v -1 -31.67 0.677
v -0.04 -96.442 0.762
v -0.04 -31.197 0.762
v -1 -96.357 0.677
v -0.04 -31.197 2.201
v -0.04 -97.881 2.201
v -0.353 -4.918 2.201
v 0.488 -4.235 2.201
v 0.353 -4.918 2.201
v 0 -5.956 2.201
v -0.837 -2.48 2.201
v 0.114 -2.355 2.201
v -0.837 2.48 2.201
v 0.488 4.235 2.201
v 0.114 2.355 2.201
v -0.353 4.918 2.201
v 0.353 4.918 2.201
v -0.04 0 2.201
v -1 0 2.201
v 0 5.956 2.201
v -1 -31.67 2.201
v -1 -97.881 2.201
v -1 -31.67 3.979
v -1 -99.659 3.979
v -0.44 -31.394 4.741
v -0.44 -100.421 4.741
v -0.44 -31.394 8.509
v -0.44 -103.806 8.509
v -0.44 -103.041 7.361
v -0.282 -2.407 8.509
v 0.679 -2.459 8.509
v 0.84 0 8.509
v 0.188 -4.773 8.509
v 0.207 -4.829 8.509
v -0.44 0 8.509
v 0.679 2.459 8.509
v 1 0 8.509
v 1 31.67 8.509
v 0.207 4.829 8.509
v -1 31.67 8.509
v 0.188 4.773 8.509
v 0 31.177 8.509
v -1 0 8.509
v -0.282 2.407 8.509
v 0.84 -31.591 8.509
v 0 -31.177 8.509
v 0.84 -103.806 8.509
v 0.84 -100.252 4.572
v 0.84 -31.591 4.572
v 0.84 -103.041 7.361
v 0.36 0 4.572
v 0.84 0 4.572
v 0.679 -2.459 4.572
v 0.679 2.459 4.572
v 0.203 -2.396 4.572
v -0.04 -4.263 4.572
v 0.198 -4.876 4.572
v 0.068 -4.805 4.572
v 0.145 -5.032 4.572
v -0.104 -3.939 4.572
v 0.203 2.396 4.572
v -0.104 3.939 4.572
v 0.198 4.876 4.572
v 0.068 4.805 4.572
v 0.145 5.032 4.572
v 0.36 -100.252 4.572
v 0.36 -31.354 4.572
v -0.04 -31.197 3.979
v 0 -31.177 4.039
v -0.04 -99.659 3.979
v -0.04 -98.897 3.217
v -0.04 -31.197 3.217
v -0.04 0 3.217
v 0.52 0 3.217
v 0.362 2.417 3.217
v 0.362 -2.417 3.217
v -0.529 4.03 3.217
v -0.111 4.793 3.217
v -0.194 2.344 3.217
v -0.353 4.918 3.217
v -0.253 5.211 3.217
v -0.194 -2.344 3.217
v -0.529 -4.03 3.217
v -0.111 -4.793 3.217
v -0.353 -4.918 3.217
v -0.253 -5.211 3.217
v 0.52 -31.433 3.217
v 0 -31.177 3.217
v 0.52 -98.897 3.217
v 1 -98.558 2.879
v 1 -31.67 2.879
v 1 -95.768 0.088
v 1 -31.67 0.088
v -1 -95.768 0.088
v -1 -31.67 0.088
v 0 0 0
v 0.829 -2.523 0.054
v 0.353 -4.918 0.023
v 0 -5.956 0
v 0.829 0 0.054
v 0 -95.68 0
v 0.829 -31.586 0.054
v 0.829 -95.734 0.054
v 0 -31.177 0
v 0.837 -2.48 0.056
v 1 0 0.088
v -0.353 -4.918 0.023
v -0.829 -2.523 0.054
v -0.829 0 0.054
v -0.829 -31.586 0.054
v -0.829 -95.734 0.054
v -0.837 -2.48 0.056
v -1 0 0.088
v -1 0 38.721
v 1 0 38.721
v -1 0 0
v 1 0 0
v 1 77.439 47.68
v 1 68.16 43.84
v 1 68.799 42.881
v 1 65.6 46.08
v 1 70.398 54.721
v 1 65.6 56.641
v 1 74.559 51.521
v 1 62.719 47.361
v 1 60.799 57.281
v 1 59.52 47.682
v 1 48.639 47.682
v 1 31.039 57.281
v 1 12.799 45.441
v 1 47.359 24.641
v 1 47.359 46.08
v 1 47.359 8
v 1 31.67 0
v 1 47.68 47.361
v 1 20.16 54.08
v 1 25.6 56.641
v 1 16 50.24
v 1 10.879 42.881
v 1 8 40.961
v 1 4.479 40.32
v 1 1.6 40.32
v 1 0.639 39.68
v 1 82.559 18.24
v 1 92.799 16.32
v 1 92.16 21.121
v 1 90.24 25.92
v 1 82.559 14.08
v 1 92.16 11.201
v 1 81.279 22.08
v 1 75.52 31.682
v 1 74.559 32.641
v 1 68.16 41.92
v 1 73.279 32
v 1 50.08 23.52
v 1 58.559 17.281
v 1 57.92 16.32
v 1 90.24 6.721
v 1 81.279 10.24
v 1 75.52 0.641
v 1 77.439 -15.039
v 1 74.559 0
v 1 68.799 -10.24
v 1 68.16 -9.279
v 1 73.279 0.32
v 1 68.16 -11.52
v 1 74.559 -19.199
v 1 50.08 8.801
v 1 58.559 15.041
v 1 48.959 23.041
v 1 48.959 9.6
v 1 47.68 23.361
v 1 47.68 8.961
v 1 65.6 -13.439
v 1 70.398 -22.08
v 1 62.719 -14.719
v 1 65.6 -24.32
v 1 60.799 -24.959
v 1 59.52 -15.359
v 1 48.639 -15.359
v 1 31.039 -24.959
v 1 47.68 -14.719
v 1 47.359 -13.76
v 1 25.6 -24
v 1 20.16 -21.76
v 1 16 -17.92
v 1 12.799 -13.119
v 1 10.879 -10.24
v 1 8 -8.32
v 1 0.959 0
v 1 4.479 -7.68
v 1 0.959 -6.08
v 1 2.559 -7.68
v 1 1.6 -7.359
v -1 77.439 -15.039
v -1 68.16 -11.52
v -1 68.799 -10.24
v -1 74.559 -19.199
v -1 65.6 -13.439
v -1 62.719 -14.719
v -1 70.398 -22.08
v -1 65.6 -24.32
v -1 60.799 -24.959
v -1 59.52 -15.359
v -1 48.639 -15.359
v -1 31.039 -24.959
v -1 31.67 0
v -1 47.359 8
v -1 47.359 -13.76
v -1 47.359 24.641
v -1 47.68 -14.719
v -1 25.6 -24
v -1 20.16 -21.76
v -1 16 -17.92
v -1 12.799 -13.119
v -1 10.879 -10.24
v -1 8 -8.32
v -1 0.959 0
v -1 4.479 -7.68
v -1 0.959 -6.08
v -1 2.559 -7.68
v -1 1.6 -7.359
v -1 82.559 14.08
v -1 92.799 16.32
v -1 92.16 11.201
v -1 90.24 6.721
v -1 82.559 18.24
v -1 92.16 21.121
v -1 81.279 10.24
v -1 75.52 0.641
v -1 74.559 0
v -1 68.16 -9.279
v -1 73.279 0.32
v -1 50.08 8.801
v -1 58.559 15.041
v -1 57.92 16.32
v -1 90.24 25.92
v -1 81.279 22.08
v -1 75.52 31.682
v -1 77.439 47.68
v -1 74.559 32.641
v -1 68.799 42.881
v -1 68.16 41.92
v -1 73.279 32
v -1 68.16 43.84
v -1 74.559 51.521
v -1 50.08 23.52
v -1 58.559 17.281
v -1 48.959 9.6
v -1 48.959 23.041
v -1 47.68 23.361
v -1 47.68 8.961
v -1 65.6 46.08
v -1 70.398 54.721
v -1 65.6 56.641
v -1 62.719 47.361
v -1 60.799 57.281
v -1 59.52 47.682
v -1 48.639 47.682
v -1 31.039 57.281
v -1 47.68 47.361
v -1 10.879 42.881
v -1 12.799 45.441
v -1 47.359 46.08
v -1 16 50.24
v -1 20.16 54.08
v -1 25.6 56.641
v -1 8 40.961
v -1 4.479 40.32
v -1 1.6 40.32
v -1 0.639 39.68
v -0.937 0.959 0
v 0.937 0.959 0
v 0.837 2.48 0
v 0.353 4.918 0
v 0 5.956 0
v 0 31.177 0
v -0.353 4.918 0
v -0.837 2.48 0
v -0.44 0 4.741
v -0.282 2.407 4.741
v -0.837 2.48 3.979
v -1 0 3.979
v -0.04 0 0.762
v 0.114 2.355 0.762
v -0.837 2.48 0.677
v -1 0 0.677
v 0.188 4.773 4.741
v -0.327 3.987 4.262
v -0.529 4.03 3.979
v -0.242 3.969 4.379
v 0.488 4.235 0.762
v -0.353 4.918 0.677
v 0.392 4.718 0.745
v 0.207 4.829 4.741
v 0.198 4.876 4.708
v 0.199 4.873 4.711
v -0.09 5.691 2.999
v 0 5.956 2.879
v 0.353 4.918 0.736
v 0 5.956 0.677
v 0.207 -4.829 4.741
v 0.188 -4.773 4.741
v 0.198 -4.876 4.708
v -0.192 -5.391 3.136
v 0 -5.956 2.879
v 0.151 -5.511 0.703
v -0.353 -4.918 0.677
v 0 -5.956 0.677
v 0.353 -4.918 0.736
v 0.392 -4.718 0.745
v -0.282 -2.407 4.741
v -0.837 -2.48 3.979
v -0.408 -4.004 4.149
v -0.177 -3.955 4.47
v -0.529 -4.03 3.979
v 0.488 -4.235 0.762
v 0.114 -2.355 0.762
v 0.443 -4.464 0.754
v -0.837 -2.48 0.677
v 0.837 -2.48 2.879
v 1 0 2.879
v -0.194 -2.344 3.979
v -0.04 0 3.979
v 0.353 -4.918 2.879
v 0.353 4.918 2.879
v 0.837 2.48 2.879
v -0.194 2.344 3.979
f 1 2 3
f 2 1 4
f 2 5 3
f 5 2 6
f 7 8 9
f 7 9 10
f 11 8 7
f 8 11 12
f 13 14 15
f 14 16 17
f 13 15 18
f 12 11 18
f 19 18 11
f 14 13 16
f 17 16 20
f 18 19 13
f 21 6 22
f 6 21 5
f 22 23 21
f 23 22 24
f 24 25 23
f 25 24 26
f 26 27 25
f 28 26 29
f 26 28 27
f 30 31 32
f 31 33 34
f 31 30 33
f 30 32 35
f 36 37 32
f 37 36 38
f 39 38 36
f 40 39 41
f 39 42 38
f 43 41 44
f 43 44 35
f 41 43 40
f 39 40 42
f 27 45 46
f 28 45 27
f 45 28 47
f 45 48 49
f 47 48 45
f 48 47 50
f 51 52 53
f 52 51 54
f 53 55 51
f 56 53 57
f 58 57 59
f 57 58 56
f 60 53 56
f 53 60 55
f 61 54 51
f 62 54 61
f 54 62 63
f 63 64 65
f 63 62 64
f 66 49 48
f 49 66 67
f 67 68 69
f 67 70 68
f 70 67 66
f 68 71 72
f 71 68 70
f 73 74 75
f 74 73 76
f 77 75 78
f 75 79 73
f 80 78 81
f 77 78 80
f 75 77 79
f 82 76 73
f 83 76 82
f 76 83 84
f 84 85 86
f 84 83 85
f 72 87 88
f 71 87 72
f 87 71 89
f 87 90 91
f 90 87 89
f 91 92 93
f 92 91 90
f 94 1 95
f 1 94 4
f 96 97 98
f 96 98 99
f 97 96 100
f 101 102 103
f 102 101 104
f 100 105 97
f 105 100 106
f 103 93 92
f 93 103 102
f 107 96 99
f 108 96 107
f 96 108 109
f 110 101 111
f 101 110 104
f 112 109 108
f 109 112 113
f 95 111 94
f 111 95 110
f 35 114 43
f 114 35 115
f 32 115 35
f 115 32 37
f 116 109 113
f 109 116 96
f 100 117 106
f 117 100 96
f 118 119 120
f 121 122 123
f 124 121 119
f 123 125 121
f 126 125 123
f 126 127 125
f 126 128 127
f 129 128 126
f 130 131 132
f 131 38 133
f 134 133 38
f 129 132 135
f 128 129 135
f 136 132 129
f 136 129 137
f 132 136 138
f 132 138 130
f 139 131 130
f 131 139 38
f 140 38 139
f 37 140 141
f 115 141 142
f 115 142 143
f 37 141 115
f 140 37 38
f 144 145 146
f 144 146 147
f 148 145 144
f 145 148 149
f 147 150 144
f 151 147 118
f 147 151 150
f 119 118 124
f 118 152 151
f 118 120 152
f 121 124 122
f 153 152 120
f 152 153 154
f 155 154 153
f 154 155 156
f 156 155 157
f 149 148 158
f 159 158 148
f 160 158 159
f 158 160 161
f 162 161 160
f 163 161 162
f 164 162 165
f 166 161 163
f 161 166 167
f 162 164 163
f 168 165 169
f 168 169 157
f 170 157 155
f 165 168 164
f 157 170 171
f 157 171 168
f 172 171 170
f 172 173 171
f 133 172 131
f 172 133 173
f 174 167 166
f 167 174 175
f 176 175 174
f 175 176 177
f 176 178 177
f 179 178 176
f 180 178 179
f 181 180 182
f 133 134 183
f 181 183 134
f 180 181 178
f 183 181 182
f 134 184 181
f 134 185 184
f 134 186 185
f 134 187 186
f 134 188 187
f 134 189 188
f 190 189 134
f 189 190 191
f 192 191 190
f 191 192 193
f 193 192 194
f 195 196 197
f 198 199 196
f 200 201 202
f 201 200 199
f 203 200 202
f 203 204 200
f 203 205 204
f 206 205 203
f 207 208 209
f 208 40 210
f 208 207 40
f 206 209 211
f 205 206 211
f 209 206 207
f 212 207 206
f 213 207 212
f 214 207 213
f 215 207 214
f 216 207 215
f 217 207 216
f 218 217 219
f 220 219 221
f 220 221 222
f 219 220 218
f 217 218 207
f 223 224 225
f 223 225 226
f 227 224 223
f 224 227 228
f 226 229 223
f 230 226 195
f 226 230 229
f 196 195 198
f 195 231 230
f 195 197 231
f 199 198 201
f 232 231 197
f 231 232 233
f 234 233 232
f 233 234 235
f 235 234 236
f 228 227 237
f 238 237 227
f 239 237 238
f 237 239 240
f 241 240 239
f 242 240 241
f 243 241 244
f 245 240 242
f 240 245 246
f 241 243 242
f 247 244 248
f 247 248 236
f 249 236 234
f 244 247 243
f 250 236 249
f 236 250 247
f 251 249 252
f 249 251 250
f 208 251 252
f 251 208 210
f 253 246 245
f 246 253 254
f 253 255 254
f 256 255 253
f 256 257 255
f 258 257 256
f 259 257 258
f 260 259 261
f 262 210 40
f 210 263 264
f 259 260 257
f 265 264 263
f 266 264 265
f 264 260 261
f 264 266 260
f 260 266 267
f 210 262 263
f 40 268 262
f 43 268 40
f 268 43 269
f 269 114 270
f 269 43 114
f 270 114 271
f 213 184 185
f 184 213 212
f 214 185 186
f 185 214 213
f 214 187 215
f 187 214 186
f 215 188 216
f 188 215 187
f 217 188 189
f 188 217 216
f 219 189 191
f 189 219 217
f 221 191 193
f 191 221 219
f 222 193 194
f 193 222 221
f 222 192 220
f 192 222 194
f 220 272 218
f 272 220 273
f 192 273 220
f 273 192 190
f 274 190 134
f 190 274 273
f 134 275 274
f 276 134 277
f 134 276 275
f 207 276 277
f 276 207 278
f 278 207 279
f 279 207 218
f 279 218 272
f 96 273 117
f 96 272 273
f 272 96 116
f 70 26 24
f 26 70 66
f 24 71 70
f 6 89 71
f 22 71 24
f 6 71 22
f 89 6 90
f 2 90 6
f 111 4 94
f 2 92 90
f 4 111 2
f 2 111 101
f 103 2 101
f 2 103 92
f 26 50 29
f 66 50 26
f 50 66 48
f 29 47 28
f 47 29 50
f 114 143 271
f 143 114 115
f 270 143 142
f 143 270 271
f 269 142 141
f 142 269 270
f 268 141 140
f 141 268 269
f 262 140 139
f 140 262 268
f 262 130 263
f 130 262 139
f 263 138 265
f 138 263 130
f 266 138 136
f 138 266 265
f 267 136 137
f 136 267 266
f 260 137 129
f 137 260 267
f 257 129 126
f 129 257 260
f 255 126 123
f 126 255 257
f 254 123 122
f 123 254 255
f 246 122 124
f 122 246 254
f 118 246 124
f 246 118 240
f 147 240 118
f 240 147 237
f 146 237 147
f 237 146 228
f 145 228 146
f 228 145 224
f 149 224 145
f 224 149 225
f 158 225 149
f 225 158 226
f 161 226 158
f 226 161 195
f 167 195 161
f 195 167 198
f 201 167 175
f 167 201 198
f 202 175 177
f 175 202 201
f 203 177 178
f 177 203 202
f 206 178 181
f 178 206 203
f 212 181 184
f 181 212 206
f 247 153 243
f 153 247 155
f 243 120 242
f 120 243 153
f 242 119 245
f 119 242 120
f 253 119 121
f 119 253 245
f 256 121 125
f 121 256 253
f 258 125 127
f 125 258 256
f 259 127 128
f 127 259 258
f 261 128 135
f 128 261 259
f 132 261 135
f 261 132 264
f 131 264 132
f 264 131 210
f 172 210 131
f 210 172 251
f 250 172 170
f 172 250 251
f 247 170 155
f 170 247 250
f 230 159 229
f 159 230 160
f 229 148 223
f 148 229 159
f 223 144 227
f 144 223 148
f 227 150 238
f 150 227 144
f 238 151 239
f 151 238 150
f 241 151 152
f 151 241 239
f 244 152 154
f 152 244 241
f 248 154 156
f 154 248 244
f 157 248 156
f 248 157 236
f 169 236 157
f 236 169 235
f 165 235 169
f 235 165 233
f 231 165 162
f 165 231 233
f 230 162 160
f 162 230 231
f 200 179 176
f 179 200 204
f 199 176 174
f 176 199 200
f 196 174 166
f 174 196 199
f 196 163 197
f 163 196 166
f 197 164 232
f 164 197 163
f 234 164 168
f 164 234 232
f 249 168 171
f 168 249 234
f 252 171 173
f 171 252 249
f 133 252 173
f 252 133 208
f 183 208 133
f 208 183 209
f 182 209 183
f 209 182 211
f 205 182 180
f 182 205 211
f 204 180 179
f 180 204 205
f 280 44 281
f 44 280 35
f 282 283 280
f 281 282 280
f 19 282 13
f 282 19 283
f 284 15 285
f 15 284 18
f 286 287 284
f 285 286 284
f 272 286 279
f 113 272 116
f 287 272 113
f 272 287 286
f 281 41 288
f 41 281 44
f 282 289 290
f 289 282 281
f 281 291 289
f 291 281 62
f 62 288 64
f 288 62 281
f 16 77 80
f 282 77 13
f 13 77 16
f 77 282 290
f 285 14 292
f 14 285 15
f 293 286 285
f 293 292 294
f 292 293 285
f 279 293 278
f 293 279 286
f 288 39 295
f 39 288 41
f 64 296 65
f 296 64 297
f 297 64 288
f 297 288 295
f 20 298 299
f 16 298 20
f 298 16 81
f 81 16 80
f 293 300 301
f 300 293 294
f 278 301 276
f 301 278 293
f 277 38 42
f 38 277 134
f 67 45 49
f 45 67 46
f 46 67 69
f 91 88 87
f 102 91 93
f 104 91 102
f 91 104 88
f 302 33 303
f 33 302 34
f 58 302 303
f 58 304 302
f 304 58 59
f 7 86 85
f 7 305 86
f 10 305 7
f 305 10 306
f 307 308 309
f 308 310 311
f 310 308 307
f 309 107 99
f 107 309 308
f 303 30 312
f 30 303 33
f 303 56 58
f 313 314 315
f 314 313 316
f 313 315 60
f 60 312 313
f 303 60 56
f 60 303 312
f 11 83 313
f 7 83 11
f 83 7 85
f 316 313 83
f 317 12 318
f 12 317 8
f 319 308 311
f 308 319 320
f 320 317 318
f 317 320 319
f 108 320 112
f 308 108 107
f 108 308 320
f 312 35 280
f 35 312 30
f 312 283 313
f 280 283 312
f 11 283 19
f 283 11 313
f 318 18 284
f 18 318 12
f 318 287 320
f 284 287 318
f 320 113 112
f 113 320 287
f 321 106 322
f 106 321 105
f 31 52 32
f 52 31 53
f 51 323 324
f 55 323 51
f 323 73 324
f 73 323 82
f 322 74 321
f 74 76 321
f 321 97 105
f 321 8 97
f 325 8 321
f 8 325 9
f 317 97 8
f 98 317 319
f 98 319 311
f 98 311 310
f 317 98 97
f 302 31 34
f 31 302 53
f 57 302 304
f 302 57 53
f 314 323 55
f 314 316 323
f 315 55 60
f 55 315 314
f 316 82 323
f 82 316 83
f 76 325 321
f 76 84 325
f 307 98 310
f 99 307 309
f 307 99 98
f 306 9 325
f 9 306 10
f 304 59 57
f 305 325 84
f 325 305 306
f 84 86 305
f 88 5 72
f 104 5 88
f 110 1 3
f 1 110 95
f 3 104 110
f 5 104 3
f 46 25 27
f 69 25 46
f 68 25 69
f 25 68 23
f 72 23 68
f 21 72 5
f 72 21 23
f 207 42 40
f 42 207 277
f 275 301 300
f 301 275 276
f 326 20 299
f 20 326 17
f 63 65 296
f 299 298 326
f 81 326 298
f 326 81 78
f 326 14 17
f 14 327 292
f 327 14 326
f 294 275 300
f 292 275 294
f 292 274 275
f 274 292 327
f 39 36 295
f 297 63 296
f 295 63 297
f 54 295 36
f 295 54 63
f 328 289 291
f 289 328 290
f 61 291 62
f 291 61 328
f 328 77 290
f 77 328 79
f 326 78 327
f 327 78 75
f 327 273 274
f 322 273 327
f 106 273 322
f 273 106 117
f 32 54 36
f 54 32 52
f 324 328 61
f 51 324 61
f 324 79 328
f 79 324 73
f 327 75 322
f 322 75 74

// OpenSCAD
// file: kwikset.gen.scad
// Automatically generated using the Inkscape to OpenSCAD Converter
// Variable names are of the form <inkscape-path-id>_points and
// <inkscape-path-id>_paths.  As a result, you can associate a polygon in this
// OpenSCAD program with the corresponding SVG element in the Inkscape document
// by looking for the XML element with the attribute id="inkscape-path-id".

outline_points = [[-16.682359, -40.298727], [-21.483139, -40.939357], [-26.281970, -42.859276], [-30.442129, -46.058496], [-33.322990, -49.900286], [-46.123770, -71.660056], [-48.043689, -76.458887], [-48.682359, -81.259666], [-48.043689, -86.378806], [-46.123770, -90.859277], [-33.322990, -112.619036], [-30.442129, -116.779197], [-26.281970, -119.660056], [-21.483139, -121.900286], [-16.682359, -122.538967], [13.077401, -122.538967], [18.516861, -121.579977], [23.956311, -119.339747], [28.116470, -115.499897], [31.317640, -110.699117], [33.237560, -107.820217], [36.116470, -105.900287], [39.637950, -105.259667], [41.557870, -105.259667], [42.516860, -104.939357], [43.157480, -103.660057], [43.157480, -97.579977], [139.796150, -97.579977], [147.157480, -90.218647], [148.436780, -88.298727], [149.077400, -85.740137], [148.436780, -83.499897], [147.157480, -81.579977], [132.837170, -65.419467], [44.116470, -65.419827], [44.116470, -58.859277], [43.477790, -57.900287], [42.516861, -57.259667], [39.637951, -57.259667], [36.116471, -56.619037], [33.237561, -54.699117], [31.317641, -52.138567], [28.116471, -47.339747], [23.956311, -43.499897], [18.516861, -40.939357], [13.077401, -40.298727], [-15.403059, -49.898337], [-4.522209, -49.898337], [-3.563219, -50.218647], [-3.242909, -51.499897], [-3.242909, -72.939357], [-3.563219, -74.218647], [-4.842519, -74.538967], [-5.963609, -74.060447], [-24.043689, -55.660056], [-24.682359, -54.699117], [-24.043689, -53.740137], [-21.483139, -51.499897], [-18.602279, -50.218647], [-30.442129, -64.939357], [-29.162829, -65.579977], [-14.442129, -80.298727], [-13.803460, -81.259667], [-14.442129, -82.538967], [-29.162829, -97.259667], [-30.442129, -97.579977], [-31.403059, -96.939357], [-37.162829, -87.339747], [-38.442129, -83.499897], [-38.442129, -79.339747], [-37.162829, -75.499897], [-31.403059, -65.898337], [-4.842520, -87.980367], [-3.563220, -88.619037], [-3.242909, -89.579977], [-3.242909, -111.339747], [-3.563220, -112.298727], [-4.522210, -112.939357], [-15.403060, -112.939357], [-18.602280, -112.298727], [-21.483140, -111.019427], [-24.043690, -109.099507], [-24.682360, -107.820217], [-24.043690, -106.859277], [-5.963610, -88.779197]];
outline_paths = [[0, 1, 2, 3, 4, 5, 6, 7, 8, 9, 10, 11, 12, 13, 14, 15, 16, 17, 18, 19, 20, 21, 22, 23, 24, 25, 26, 27, 28, 29, 30, 31, 32, 33, 34, 35, 36, 37, 38, 39, 40, 41, 42, 43, 44, 45], [58, 57, 56, 55, 54, 53, 52, 51, 50, 49, 48, 47, 46], [71, 70, 69, 68, 67, 66, 65, 64, 63, 62, 61, 60, 59], [84, 83, 82, 81, 80, 79, 78, 77, 76, 75, 74, 73, 72]];

warding_kw1_points = [[-91.133659, 110.770103], [-91.133659, 107.891433], [-89.133657, 107.891418], [-89.133657, 108.568733], [-90.093664, 108.653433], [-90.093664, 110.092748], [-89.133657, 110.092748], [-89.133657, 111.870748], [-89.693658, 112.632733], [-89.693658, 116.400553], [-90.973663, 116.400553], [-90.973663, 112.463403], [-90.493662, 112.463403], [-90.093664, 111.870733], [-90.093664, 111.108733], [-90.653659, 111.108733], [-91.133660, 110.770063]];
warding_kw1_paths = [[0, 1, 2, 3, 4, 5, 6, 7, 8, 9, 10, 11, 12, 13, 14, 15, 16]];

engrave_points = [[-125.793622, 118.058646], [-126.556072, 118.051646], [-127.487402, 118.305646], [-128.334071, 118.898306], [-128.842072, 119.744976], [-129.604072, 120.845646], [-130.704742, 121.776966], [-131.890072, 122.369636], [-133.244742, 122.538966], [-141.118737, 122.538966], [-142.304070, 122.369636], [-143.404737, 121.946306], [-144.420737, 121.184306], [-145.098070, 120.252966], [-148.400068, 114.495636], [-148.908068, 113.394976], [-149.077401, 112.209636], [-148.908068, 111.024306], [-148.442401, 109.923637], [-145.098070, 104.166307], [-144.420737, 103.150306], [-143.404737, 102.472977], [-142.304070, 101.964977], [-141.118737, 101.795647], [-133.244742, 101.795647], [-131.890072, 102.049647], [-130.704742, 102.557647], [-129.604072, 103.488977], [-128.842072, 104.674307], [-128.334071, 105.436307], [-127.656742, 106.028976], [-126.725402, 106.282977], [-125.793622, 106.282977]];
engrave_paths = [[0, 1, 2, 3, 4, 5, 6, 7, 8, 9, 10, 11, 12, 13, 14, 15, 16, 17, 18, 19, 20, 21, 22, 23, 24, 25, 26, 27, 28, 29, 30, 31, 32]];

//polygon(points=outline_points, paths=outline_paths);
//polygon(points=warding_kw1_points, paths=warding_kw1_paths);
//polygon(points=engrave_points, paths=engrave_paths);
// file: keygen.scad
$inf=1000;
$eps=.01;

function key_move(points, offset) = [
    for(p=points) [p[0] + offset[0],
                   p[1] + offset[1]]
];

module key_outline(outline_points, thickness, outline_paths=undef) {
    rotate(-90, [0, 1, 0]) rotate(-90, [0, 0, 1]) // Rotate into the correct plane
        linear_extrude(height=thickness, center=true) // Extrude the key outline
            polygon(points=outline_points, paths=outline_paths); // Draw the outline
}

module key_blade(warding, plug_diameter=0) {
    // Draw the blade to infinity in Y
    // optionally intersected with the plug cylinder
    // to round the bottom
    intersection() {
        rotate(180, [0, 0, 1]) rotate(90, [1, 0, 0])
            linear_extrude(height=2*$inf, center=true)
                polygon(warding);

        // Draw the plug, if a plug diameter is specified
        if(plug_diameter > 0) {
            // Draw infinite cylinder in -Y
            translate([0, 0, 0.5*plug_diameter]) rotate(90, [1, 0, 0])
                cylinder(r=0.5*plug_diameter, h=$inf, center=true, $fn=$fn ? 4*$fn : 48);
        }
    }
}

module key_x_line(length) {
    // Hack to draw a line in X
    // since OpenSCAD does not support line primitives
    // Take a 2D square and rotate it
    // When it is orthogonal to the XY plane,
    // it projects down to a line
    rotate(90, [1, 0, 0])
    square([length, length], center=true);
}

module key_warding_cutter(warding, blade_height, cutter_radius, left) {
    neg = left ? -1 : 1;
    translate([neg * cutter_radius, 0, 0])
        rotate_extrude($fn=$fn ? 4*$fn : 48)
            translate([neg * cutter_radius, 0])
                difference() {
                    translate([0, 0.5*blade_height])
                        square([2 * cutter_radius, blade_height], center=true);
                    minkowski() {
                        translate([neg * 1.5 * cutter_radius, 0])
                            key_x_line(3 * cutter_radius);
                        polygon(warding);
                    }
                    polygon(warding);
                }
}

module key_engrave(engrave_points, engrave_depth, left, thickness, engrave_paths=undef) {
    translate([(left ? -1 : 1) * 0.5*thickness, 0, 0]) rotate(-90, [0, 1, 0]) rotate(-90, [0, 0, 1]) // Translate and rotate into the correct soot
        linear_extrude(height=2*engrave_depth, center=true) // Extrude the key outline
            polygon(points=engrave_points, paths=engrave_paths); // Draw the outline
}

module key_blank(outline_points,
                warding,
                outline_paths=undef,
                engrave_right_points=[],
                engrave_right_paths=undef,
                engrave_left_points=[],
                engrave_left_paths=undef,
                bow_thickness=0,
                engrave_depth=.1,
                plug_diameter=0,
                offset=[0, 0],
                cutter_radius=18,
                milling_offset=0) {

    // Find the bounding box of the warding
    warding_min = [min([for(e=warding) e[0]]), min([for(e=warding) e[1]])];
    warding_max = [max([for(e=warding) e[0]]), max([for(e=warding) e[1]])];

    // Apply the given offset to the outline,
    // holes, and engrave
    outline_adj = key_move(outline_points, offset);
    engrave_left_adj = key_move(engrave_left_points, offset);
    engrave_right_adj = key_move(engrave_right_points, offset);

    // Move the warding profile
    // so that it is centered in X
    // and non-negative in Y
    warding_offset = [-0.5 * (warding_min[0] + warding_max[0]),
                      -warding_min[1]];
    warding_adj = key_move(warding, warding_offset);

    // Infer various key properties
    thickness = (bow_thickness == 0) ? abs(warding_max[0] - warding_min[0]) : bow_thickness;
    blade_height = abs(warding_max[1] - warding_min[1]);

    // Cut out the warding milling artifacts
    // from the bow
    difference() {
        // Create the bulk of the keyblank
        // by intersecting the outline
        // with the warding profile
        // and the plug
        intersection() {
            // Draw the key outline and holes
            key_outline(outline_adj, thickness, outline_paths);
            
            // Draw the blade, and a giant box where the bow is
            // so that we don't wipe out the bow
            // when the intersection happens
            union() {
                // Fill +Y half-space
                translate([0, $inf/2+milling_offset, 0])
                    cube([$inf, $inf, $inf], center=true);

                key_blade(warding_adj, plug_diameter);
            }
        }
        // Draw the milling wheels that cut the warding
        if(cutter_radius != 0) {
            translate([0, milling_offset, 0])
                union() {
                    key_warding_cutter(warding_adj, blade_height, cutter_radius, false);
                    key_warding_cutter(warding_adj, blade_height, cutter_radius, true);
                }
        }

        // Draw the engraveing
        key_engrave(engrave_right_adj, engrave_depth, false, thickness, engrave_right_paths);
        key_engrave(engrave_left_adj, engrave_depth, true, thickness, engrave_left_paths);
    }
}

function key_code_to_heights(code, depth_table) = [for(i=key_enum(code)) depth_table[search(code[i], "0123456789")[0]]];

module key_bitting_cutter(flat, angle, tool_height) {
    polygon([[-0.5 * flat, 0],
            [0.5 * flat, 0],
            [0.5 * flat + tan(0.5 * angle) * tool_height, tool_height],
            [-0.5 * flat - tan(0.5 * angle) * tool_height, tool_height]]);
}

module key_bitting(heights,
                   locations,
                   flat,
                   angle=100,
                   cutter_width=5,
                   cutter_height=5) {
    // Rotate the cutting tool to the proper orientation
    rotate(-90, [0, 0, 1]) rotate(90, [1, 0, 0])
        // Union together a handful of trapezoids
        // that comprise the cuts
        union() {
            for(i=key_enum(heights)) {
                // Move to the proper location and height
                translate([locations[i], heights[i]])
                    linear_extrude(height=cutter_width, center=true)
                        key_bitting_cutter(flat, angle, cutter_height);
            }
        }
}

function key_lkup(ks, vs, k) = vs[search([k], [for(ki=ks) [ki]])[0]];
    
function key_enum(l) = len(l) > 0 ? [for(i=[0:len(l)-1]) i] : [];
// main file
use <keygen.scad>
include <kwikset.gen.scad>

module kwikset(bitting="",
               outline_name="KW1",
               warding_name="KW1") {

    name = "Kwikset";

    /*
        Bitting is specified from bow to tip, 1-7, with 1 being the shallowest cut and 7 being the deepest.
        Example: 25363
    */

    outlines_k = ["KW1"];
    outlines_v = [[outline_points, outline_paths,
                   [-outline_points[34][0], -outline_points[26][1]],
                   engrave_points,
                   engrave_paths]];
    wardings_k = ["KW1"];
    wardings_v = [warding_kw1_points];

    outline_param = key_lkup(outlines_k, outlines_v, outline_name);
    outline_points = outline_param[0];
    outline_paths = outline_param[1];
    offset = outline_param[2];
    engrave_points = outline_param[3];
    engrave_paths = outline_param[4];

    warding_points = key_lkup(wardings_k, wardings_v, warding_name);
    
    cut_locations = [for(i=[.247, .397, .547, .697, .847]) i*25.4];
    // Kwikset starts with 1??
    depth_table = [for(i=[0.329+0.023:-0.023:0.190]) i*25.4];

    heights = key_code_to_heights(bitting, depth_table);

    difference() {
        if($children == 0) {
            key_blank(outline_points,
                      warding_points,
                      outline_paths=outline_paths,
                      engrave_right_points=engrave_points,
                      engrave_right_paths=engrave_paths,
                      engrave_left_points=engrave_points,
                      engrave_left_paths=engrave_paths,
                      offset=offset,
                      plug_diameter=12.7);
        } else {
            children(0);
        }
        key_bitting(heights, cut_locations, 2.1336, 90);
    }
}

// Defaults
bitting="";
outline="KW1";
warding="KW1";
kwikset(bitting, outline, warding);
